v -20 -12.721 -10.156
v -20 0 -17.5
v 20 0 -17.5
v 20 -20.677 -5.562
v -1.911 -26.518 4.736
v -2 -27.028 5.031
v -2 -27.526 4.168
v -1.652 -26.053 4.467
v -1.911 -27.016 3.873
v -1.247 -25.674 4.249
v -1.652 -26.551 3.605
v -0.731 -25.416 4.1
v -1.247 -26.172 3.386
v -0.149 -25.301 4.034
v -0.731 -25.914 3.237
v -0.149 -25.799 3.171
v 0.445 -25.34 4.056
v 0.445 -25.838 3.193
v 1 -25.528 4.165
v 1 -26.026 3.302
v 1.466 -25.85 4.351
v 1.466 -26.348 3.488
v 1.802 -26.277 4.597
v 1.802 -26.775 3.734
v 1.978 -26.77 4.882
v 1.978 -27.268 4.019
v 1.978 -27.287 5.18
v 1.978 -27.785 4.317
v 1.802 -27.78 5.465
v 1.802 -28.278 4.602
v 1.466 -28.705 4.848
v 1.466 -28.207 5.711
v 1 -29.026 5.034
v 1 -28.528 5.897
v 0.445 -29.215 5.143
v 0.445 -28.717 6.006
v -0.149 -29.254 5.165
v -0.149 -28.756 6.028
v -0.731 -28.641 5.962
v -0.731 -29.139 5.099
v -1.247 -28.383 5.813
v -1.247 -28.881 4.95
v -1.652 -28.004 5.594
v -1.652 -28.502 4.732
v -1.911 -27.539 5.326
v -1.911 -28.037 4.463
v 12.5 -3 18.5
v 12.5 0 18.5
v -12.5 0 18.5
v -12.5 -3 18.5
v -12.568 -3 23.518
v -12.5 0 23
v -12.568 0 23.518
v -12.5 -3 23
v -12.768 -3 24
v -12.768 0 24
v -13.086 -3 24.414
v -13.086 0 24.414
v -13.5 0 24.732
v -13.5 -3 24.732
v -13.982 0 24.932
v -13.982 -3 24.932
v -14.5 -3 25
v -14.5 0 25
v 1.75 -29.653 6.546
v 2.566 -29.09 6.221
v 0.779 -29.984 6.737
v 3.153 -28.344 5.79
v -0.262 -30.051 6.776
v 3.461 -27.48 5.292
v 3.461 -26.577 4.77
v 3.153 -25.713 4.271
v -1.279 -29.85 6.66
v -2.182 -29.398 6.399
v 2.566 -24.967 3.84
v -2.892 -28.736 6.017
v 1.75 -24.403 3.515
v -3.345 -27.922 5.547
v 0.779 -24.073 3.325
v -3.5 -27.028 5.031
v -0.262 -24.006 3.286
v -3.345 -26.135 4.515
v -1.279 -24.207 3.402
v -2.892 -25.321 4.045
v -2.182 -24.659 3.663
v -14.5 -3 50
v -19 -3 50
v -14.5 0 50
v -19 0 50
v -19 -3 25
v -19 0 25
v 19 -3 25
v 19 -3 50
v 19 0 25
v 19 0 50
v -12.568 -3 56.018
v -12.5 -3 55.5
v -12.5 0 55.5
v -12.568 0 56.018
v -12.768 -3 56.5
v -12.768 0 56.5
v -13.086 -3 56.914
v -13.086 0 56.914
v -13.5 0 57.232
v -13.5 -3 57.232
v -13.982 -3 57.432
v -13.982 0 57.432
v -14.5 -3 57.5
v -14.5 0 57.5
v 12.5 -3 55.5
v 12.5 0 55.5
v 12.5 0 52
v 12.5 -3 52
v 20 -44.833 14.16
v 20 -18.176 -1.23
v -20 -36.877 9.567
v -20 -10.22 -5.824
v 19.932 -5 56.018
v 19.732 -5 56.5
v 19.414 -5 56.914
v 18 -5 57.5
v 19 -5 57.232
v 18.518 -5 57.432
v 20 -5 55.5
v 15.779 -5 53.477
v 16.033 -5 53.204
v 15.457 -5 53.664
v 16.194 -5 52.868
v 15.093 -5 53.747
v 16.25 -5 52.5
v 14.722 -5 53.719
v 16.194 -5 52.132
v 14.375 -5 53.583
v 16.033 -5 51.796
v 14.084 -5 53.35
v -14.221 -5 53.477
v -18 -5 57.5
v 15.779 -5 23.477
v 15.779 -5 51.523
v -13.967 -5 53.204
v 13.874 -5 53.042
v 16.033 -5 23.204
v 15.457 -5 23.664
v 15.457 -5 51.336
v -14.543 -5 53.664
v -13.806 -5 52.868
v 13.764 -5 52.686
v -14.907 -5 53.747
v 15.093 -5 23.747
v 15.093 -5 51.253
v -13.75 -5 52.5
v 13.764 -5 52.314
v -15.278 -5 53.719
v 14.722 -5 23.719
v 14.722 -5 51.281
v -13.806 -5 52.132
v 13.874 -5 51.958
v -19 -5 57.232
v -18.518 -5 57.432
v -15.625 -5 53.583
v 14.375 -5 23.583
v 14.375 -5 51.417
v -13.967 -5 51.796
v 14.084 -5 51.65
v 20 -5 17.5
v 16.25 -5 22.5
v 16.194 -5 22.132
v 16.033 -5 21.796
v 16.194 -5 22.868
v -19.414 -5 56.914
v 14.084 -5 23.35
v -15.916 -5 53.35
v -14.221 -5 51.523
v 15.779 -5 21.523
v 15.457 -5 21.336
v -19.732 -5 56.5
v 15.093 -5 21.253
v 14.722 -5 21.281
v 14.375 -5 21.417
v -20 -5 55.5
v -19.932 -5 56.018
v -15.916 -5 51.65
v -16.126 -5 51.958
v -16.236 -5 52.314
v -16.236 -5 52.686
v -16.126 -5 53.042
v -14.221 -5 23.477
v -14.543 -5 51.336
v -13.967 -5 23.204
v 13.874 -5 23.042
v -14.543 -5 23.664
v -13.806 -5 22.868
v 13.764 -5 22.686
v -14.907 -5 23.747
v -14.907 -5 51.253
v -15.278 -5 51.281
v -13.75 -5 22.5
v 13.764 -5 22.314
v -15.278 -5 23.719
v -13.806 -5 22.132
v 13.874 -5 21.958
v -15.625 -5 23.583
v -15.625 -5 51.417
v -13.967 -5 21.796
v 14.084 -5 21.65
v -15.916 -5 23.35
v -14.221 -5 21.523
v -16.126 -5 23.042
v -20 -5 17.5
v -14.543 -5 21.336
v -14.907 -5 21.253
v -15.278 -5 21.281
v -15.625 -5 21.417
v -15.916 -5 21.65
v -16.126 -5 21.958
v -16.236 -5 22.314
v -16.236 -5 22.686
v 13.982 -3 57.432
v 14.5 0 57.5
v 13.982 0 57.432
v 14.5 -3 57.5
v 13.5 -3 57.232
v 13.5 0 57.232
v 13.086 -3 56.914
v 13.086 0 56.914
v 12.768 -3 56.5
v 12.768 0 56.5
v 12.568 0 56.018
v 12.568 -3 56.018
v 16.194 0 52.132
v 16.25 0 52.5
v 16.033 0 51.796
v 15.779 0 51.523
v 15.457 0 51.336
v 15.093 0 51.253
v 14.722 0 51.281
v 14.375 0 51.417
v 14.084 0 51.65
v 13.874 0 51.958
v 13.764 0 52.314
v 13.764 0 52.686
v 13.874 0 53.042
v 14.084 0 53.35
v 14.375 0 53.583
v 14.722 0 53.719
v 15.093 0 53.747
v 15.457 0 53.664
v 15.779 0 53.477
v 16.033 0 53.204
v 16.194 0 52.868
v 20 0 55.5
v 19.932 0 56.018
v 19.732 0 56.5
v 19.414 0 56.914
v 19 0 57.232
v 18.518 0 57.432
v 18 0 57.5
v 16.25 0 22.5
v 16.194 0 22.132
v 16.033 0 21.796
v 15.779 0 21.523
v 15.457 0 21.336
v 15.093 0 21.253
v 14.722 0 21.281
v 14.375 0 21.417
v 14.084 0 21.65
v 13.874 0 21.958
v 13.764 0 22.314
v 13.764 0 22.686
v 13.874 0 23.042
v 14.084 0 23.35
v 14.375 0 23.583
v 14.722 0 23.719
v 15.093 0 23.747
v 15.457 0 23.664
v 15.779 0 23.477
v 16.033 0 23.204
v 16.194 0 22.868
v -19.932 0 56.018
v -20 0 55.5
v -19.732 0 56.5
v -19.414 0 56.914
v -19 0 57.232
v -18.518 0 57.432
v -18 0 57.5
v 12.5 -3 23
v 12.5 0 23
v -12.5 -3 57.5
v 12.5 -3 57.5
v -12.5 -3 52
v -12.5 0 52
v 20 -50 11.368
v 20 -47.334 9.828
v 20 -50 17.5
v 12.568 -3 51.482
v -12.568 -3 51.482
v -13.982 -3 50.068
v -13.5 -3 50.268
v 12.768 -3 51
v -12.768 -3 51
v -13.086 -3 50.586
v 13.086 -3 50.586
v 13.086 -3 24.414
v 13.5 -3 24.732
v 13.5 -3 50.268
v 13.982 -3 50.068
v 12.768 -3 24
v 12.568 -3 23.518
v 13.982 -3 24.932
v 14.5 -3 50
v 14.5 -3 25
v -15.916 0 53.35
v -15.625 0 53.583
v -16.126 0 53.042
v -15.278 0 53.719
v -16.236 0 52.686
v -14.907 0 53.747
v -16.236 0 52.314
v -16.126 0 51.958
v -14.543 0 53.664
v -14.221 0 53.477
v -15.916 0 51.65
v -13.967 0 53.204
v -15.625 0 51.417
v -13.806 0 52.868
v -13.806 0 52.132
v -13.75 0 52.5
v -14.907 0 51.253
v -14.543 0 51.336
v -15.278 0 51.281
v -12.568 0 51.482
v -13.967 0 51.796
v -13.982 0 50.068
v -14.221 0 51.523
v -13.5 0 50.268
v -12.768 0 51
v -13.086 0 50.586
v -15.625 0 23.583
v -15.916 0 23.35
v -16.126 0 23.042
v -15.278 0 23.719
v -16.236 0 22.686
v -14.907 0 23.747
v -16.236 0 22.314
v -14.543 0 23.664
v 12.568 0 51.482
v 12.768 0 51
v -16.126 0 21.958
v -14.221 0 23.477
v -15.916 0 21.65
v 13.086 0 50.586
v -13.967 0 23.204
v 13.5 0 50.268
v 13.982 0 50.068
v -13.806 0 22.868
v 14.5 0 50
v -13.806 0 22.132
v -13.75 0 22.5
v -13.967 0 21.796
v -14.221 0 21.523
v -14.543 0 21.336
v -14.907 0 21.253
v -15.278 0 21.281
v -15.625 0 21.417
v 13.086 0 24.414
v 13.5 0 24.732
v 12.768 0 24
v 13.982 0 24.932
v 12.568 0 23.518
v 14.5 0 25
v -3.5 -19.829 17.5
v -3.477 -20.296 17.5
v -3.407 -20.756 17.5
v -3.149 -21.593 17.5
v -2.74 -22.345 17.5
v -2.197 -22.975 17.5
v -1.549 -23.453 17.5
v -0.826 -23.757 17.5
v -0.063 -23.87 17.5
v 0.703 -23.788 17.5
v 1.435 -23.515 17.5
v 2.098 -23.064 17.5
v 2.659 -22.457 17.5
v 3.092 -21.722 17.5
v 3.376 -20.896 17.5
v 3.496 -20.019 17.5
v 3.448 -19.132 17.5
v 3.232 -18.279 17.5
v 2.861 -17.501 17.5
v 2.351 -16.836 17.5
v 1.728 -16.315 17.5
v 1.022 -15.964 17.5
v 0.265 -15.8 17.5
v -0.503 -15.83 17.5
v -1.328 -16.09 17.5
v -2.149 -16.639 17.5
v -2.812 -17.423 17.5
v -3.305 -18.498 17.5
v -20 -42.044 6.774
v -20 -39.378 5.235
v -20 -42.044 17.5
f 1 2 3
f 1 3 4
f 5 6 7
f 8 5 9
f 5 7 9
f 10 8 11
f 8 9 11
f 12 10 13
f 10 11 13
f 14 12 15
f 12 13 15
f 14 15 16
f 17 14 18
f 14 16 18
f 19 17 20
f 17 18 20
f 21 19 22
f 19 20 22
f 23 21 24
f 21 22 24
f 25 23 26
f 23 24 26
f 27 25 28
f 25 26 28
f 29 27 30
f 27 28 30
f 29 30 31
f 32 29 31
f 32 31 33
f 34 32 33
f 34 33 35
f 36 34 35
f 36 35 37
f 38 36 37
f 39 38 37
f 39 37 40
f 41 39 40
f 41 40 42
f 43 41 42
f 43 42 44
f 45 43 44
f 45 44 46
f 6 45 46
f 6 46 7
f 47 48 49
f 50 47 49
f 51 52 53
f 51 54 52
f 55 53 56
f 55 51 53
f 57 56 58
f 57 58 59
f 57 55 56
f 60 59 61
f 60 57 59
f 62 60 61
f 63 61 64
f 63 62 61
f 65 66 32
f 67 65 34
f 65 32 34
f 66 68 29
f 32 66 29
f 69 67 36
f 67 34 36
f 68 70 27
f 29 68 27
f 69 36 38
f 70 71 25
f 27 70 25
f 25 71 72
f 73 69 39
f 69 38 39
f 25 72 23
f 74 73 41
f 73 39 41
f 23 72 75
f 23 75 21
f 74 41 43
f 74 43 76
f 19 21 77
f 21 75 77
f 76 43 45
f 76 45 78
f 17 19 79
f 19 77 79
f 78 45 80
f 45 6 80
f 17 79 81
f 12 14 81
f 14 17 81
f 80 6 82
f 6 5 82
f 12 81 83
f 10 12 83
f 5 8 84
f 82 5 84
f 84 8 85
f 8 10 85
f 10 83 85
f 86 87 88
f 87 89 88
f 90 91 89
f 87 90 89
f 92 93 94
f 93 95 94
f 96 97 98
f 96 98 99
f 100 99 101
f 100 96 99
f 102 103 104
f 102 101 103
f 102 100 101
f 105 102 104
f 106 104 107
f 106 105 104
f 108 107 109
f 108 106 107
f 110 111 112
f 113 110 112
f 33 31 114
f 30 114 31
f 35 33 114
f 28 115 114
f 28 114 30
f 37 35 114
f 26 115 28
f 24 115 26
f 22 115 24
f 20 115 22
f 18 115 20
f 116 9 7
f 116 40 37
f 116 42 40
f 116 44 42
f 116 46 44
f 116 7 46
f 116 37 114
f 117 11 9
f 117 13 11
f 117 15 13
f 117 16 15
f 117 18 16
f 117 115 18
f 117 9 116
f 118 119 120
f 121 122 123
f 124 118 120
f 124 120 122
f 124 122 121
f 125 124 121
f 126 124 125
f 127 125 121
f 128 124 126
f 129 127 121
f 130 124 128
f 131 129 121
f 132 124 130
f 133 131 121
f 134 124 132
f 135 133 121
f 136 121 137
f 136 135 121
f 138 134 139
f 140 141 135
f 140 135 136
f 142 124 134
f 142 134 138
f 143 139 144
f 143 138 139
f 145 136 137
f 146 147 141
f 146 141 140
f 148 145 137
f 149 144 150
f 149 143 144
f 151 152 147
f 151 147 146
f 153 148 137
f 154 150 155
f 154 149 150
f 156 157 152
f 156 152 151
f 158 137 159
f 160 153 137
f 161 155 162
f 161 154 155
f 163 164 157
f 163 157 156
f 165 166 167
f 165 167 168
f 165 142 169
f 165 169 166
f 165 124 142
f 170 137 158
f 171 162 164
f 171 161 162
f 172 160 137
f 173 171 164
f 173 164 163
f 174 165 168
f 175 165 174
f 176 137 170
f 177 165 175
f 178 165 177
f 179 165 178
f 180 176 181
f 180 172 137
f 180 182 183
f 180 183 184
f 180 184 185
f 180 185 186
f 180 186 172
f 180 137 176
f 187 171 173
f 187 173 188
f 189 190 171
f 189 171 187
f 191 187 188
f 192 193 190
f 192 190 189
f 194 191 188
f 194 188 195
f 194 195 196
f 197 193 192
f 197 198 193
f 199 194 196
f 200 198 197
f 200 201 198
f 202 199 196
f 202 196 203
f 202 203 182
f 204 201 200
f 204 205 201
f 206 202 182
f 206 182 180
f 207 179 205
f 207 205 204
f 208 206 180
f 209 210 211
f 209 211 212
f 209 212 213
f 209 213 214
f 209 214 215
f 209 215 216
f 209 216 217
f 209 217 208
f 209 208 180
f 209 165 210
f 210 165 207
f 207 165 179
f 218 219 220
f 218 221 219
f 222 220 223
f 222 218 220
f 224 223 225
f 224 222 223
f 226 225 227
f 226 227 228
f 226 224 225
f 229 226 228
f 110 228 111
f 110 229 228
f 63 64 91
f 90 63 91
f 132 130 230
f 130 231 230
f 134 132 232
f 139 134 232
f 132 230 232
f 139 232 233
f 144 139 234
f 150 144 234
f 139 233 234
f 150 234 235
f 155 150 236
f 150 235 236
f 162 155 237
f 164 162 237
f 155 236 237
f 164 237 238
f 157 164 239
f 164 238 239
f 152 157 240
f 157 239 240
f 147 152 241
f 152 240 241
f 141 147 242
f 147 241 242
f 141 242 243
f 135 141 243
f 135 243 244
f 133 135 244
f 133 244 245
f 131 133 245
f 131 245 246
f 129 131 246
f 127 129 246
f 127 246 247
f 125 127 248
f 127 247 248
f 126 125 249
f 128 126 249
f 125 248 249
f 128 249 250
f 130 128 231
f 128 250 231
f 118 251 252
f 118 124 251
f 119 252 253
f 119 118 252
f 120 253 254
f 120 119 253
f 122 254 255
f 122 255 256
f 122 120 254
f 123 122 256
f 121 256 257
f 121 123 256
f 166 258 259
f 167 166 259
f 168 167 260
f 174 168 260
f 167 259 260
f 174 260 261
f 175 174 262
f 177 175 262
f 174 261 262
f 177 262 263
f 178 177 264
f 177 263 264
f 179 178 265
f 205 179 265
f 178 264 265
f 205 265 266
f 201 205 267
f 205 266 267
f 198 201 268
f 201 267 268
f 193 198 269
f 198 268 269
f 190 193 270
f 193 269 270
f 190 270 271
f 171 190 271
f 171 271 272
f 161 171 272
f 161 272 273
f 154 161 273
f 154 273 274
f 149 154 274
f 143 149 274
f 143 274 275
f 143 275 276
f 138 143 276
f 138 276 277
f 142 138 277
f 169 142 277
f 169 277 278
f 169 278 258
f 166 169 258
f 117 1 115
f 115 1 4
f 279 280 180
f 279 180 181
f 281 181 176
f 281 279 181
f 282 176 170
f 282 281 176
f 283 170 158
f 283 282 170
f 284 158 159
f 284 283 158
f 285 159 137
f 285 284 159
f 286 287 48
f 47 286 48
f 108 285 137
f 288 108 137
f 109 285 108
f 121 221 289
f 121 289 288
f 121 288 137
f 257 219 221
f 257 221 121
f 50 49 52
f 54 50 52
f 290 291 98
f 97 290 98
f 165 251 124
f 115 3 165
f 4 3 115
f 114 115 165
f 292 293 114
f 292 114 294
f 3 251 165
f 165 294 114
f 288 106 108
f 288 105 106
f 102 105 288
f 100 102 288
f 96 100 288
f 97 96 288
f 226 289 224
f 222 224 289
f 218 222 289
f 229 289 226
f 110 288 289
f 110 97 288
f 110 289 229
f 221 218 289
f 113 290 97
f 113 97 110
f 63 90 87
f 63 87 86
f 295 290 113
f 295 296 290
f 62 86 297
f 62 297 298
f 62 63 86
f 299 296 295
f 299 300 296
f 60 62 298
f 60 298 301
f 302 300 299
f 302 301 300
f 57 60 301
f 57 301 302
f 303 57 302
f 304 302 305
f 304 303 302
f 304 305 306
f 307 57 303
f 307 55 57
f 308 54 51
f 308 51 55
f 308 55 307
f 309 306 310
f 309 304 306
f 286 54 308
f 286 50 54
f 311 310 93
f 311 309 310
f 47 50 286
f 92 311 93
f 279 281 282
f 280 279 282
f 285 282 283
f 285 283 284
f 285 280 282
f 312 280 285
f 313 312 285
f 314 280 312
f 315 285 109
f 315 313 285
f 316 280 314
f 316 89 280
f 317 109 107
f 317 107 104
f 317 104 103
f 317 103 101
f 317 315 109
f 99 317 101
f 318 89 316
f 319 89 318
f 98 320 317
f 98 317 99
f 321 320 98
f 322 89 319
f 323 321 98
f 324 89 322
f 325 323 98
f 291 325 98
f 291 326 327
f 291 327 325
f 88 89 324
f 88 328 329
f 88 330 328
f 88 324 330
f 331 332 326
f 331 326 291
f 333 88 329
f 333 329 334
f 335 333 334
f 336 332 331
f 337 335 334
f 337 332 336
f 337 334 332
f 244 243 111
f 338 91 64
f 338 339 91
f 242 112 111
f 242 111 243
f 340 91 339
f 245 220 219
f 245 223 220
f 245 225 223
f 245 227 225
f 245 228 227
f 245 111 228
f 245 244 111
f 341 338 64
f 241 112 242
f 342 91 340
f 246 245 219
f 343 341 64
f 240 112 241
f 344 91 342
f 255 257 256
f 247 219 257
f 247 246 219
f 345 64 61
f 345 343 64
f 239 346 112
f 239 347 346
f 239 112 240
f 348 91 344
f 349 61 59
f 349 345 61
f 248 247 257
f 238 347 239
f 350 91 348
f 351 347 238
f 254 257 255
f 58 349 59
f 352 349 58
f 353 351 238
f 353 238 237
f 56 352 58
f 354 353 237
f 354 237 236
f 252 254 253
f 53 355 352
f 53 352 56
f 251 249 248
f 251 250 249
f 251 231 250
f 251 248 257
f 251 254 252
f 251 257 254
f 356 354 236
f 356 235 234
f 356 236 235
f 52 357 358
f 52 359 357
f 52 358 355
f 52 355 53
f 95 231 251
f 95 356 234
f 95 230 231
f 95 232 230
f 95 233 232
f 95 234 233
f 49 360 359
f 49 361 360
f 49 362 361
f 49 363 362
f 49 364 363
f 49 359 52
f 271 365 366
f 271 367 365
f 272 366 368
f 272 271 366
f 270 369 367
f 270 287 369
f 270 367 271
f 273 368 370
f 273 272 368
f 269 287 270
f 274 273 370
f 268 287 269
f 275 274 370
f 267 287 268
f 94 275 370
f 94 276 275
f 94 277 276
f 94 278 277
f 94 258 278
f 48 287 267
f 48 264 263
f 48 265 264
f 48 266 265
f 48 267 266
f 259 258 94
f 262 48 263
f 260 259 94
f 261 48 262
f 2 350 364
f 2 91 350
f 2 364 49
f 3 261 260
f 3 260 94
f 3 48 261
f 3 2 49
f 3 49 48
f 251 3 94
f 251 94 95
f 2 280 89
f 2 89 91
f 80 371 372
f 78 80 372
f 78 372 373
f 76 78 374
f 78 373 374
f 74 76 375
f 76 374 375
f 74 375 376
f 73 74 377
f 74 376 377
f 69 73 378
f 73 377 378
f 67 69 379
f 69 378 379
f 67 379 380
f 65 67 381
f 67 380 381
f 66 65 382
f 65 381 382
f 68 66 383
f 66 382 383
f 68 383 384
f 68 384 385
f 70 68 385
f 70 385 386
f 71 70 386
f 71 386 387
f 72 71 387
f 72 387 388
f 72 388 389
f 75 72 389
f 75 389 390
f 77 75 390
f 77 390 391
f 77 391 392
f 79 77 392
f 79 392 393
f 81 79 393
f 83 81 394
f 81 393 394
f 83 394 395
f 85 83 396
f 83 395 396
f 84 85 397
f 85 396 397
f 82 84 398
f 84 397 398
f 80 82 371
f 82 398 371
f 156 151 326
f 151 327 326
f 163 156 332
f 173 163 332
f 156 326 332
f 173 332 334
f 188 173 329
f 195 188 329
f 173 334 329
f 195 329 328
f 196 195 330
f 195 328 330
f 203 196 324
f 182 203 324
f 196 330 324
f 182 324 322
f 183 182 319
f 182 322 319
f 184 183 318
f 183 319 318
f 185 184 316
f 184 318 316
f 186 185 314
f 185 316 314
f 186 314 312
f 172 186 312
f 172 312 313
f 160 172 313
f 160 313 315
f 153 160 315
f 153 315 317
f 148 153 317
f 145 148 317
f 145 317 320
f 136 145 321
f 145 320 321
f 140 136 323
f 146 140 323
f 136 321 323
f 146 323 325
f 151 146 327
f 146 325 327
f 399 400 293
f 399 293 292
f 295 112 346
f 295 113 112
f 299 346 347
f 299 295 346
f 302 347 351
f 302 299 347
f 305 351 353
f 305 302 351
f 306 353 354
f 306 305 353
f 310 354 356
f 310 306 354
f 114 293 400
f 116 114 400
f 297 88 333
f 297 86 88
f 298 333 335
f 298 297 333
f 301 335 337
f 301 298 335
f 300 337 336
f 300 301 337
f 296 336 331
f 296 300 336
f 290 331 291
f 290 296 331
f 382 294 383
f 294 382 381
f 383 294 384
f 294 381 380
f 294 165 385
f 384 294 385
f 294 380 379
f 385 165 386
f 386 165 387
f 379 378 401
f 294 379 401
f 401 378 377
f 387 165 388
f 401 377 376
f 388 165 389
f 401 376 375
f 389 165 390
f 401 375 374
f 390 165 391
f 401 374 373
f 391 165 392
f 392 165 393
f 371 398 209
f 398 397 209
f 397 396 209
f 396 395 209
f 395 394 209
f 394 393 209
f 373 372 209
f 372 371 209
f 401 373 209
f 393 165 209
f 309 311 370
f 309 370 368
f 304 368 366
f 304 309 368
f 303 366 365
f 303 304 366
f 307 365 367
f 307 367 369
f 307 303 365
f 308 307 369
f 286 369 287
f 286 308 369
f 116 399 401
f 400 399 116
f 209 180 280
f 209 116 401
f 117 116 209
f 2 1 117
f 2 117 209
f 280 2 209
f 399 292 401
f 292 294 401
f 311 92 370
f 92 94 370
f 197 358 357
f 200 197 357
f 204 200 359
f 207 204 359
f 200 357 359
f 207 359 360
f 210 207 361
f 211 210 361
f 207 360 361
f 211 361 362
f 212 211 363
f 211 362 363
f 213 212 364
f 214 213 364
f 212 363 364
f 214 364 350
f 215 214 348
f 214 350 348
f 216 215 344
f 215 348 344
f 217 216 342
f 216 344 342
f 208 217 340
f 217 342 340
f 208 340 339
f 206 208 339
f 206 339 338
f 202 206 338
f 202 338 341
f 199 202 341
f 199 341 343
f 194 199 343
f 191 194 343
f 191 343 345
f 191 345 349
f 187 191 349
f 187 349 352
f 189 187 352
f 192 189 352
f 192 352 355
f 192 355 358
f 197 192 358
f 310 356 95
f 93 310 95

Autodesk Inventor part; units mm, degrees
ref_plane "YZ Plane" through (0, 0, 0) normal (1, 0, 0) x (0, 1, 0)
ref_plane "XZ Plane" through (0, 0, 0) normal (0, 1, 0) x (-1, 0, 0)
sketch "Sketch1" plane through (0, 0, 0) normal (0, 1, 0) x (-1, 0, 0)
  line L0 (19, 19) -> (-19, 19) construction
  line L1 (-19, 19) -> (-19, -19) construction
  line L2 (-19, -19) -> (19, -19) construction
  line L3 (19, -19) -> (19, 19) construction
  line L4 (19, 19) -> (-19, -19) construction
  line L5 (-19, 19) -> (19, -19) construction
  circle A0 centre (15, -15) radius 1.25
  circle A1 centre (-15, -15) radius 1.25
  circle A2 centre (15, 15) radius 1.25
  circle A3 centre (-15, 15) radius 1.25
  line L6 (20, 20) -> (-20, 20)
  line L7 (-20, 20) -> (-20, -20)
  line L8 (-20, -20) -> (20, -20)
  line L9 (20, -20) -> (20, 20)
  line L10 (20, 20) -> (-20, -20) construction
  line L11 (-20, 20) -> (20, -20) construction
  point P0 (0, 0)
  dimension "d0" = 38
  dimension "d1" = 38
  dimension "d2" = 2.5
  dimension "d3" = 2.5
  dimension "d4" = 2.5
  dimension "d5" = 2.5
  dimension "d6" = 4
  dimension "d7" = 4
  dimension "d8" = 4
  dimension "d9" = 4
  dimension "d10" = 40
  dimension "d11" = 40
extrude "Extrusion1" add sketch "Sketch1" along normal blind 5
sketch "Sketch2" plane through (0, 5, 0) normal (0, 1, 0) x (1, 0, 0)
  line L0 (-12.5, 19) -> (-12.5, 12.5)
  line L1 (-12.5, 12.5) -> (-19, 12.5)
  line L2 (-19, 12.5) -> (-19, -12.5)
  line L3 (-20, 20) -> (-20, -20) projected
  line L4 (-19, -12.5) -> (-12.5, -12.5)
  line L5 (-12.5, -12.5) -> (-12.5, -20)
  line L6 (-12.5, -20) -> (12.5, -20)
  line L7 (12.5, -20) -> (12.5, -12.5)
  line L8 (12.5, -12.5) -> (19, -12.5)
  line L9 (19, -12.5) -> (19, 12.5)
  line L10 (19, 12.5) -> (12.5, 12.5)
  line L11 (12.5, 12.5) -> (12.5, 19)
  line L12 (12.5, 19) -> (-12.5, 19)
  point P0 (0, 0)
  dimension "d14" = 25
  dimension "d15" = 6.5
  dimension "d16" = 25
  dimension "d17" = 7.5
  dimension "d18" = 6.5
  dimension "d19" = 6.5
  dimension "d20" = 25
  dimension "d21" = 6.5
  dimension "d22" = 12.5
  dimension "d24" = 12.5
extrude "Extrusion2" cut sketch "Sketch2" against normal blind 3
sketch "Sketch3" plane through (0, 2, 0) normal (0, 1, 0) x (1, 0, 0)
  line L0 (12.5, -12.5) -> (12.5, -20) projected
  line L1 (-12.5, -20) -> (12.5, -20)
  line L2 (12.5, -20) -> (12.5, -16)
  line L3 (12.5, -16) -> (-12.5, -16)
  line L4 (-12.5, -16) -> (-12.5, -20)
  point P0 (0, 0)
  dimension "d27" = 4
extrude "Extrusion3" cut sketch "Sketch3" against normal through all
fillet "Fillet1" radius 2 10 edges at (-20, 2.5, -20) (20, 2.5, -20) (-20, 2.5, 20) (20, 2.5, 20) (-12.5, 3.5, -12.5) (12.5, 3.5, -12.5) (12.5, 3.5, 12.5) (-12.5, 3.5, 12.5) (-12.5, 2.5, 20) (12.5, 2.5, 20)
sketch "Sketch4" plane through (0, 0, 0) normal (0, -1, 0) x (1, 0, 0)
  line L0 (-20, -17.5) -> (20, -17.5)
  line L1 (20, -17.5) -> (20, 17.5)
  line L2 (20, 17.5) -> (-20, 17.5)
  line L3 (-20, 17.5) -> (-20, -17.5)
  line L4 (-20, -17.5) -> (20, 17.5) construction
  line L5 (20, -17.5) -> (-20, 17.5) construction
  point P0 (0, 0)
  dimension "d31" = 40
  dimension "d32" = 35
extrude "Extrusion4" add sketch "Sketch4" along normal blind 50
sketch "Sketch6" plane through (-20, 0, 17.5) normal (0, 0, 1) x (1, 0, 0)
  line L0 (40, 0) -> (40, -50) projected
  line L1 (40, -50) -> (0, -42.0435)
  line L2 (0, 0) -> (0, -50) projected
  line L3 (40, -50) -> (80.7836, -50) construction
  line L4 (0, -42.0435) -> (0, -50)
  line L5 (0, -50) -> (40, -50)
  point P0 (20, 0)
  dimension "d35" = 168.75
extrude "Extrusion5" cut sketch "Sketch6" against normal through all
sketch "Sketch7" plane through (20, 0, 17.5) normal (1, 0, 0) x (0, 0, 1)
  line L0 (-35, 0) -> (-35, 50) projected
  line L1 (-35, 0) -> (-6.1325, 50)
  line L2 (-35, 50) -> (0, 50) projected
  line L3 (-35, 0) -> (22.735, 0) construction
  line L4 (-6.1325, 50) -> (-35, 50)
  line L5 (-35, 50) -> (-35, 0)
  point P0 (-17.5, 0)
  dimension "d38" = 120
extrude "Extrusion6" cut sketch "Sketch7" against normal through all
sketch "Sketch17" plane through (20, 0, -17.5) normal (0, -0.5, -0.8660254) x (-1, 0, 0)
  line L0 (40, -48.5477) -> (0, -57.735) construction
  line L1 (40, 0) -> (40, -48.5477) construction
  line L2 (0, 0) -> (40, 0) construction
  line L3 (0, -57.735) -> (0, 0) construction
  line L4 (0, -54.6569) -> (40, -45.4695) construction
  line L5 (0, -23.8758) -> (40, -14.6884) construction
  line L6 (0, -54.6569) -> (40, -45.4695)
  line L7 (40, -14.6884) -> (0, -23.8758)
  line L8 (0, -23.8758) -> (0, -54.6569)
  line L9 (40, -45.4695) -> (40, -14.6884)
  point P0 (20, -8.75)
  dimension "d60" = 30
  dimension "d61" = 3
extrude "Extrusion9" cut sketch "Sketch17" against normal blind 5
sketch "Sketch18" plane through (20, 2.5, -13.1699) normal (0, -0.5, -0.8660254) x (-1, 0, 0)
  line L0 (40, -14.6884) -> (40, -45.4695) construction
  line L1 (0, -23.8758) -> (40, -14.6884) construction
  line L2 (0, -54.6569) -> (0, -23.8758) construction
  line L3 (40, -45.4695) -> (0, -54.6569) construction
  line L4 (0, -54.6569) -> (40, -14.6884) construction
  line L5 (0, -23.8758) -> (40, -45.4695) construction
  circle A0 centre (20, -34.6727) radius 2
  circle A1 centre (20, -34.6727) radius 4.6064
  point P0 (20, -8.75)
  dimension "d64" = 4
extrude "Extrusion11" cut sketch "Sketch18" against normal through all contours A0
ref_plane "Work Plane3" through (20, 15.5, 9.3468) normal (0, -0.5, -0.8660254) x (-1, 0, 0)
sketch "Sketch20" plane through (20, 15.5, 9.3468) normal (0, -0.5, -0.8660254) x (-1, 0, 0)
  circle A0 centre (20, -34.6727) radius 2 projected
  circle A1 centre (20, -34.6727) radius 3.5
  point P0 (20, -8.75)
  dimension "d70" = 7
extrude "Extrusion12" cut sketch "Sketch20" along normal blind 25
sketch "Sketch21" plane through (-20, 0, 17.5) normal (0, 0, 1) x (1, 0, 0)
  line L0 (0, 0) -> (40, 0)
  line L1 (40, 0) -> (40, -5)
  line L2 (40, -5) -> (0, -5)
  line L3 (0, -5) -> (0, 0)
  point P0 (20, 0)
  dimension "d73" = 5
extrude "Extrusion13" add sketch "Sketch21" along normal blind 40
sketch "Sketch22" plane through (20, 0, -18) normal (1, 0, 0) x (0, 0, -1)
  line L0 (2, 0) -> (0, 0) projected
  line L1 (-38, 5) -> (-36, 5) projected
  line L2 (2, 0) -> (-38, 0)
  line L3 (-38, 0) -> (-38, 5)
  line L4 (-38, 5) -> (2, 5)
  line L5 (2, 5) -> (2, 0)
  point P0 (-18, 0)
extrude "Extrusion14" cut sketch "Sketch22" against normal through all
sketch "Sketch23" plane through (-20, 0, 57.5) normal (0, 1, 0) x (1, 0, 0)
  line L0 (40, 0) -> (0, 0) construction
  line L1 (20, 0) -> (20, 20) construction
  line L2 (39, 39) -> (1, 39) construction
  line L3 (1, 39) -> (1, 1) construction
  line L4 (1, 1) -> (39, 1) construction
  line L5 (39, 1) -> (39, 39) construction
  line L6 (39, 39) -> (1, 1) construction
  line L7 (1, 39) -> (39, 1) construction
  circle A0 centre (35, 5) radius 1.25
  line L8 (20, 20) -> (1, 20) construction
  circle A1 centre (5, 5) radius 1.25
  circle A2 centre (35, 35) radius 1.25
  circle A3 centre (5, 35) radius 1.25
  point P0 (20, 57.5)
  dimension "d78" = 20
  dimension "d79" = 38
  dimension "d80" = 38
  dimension "d81" = 4
  dimension "d82" = 2.5
extrude "Extrusion15" cut sketch "Sketch23" against normal through all
sketch "Sketch24" plane through (-20, 0, 57.5) normal (0, 1, 0) x (1, 0, 0)
  line L0 (1, 7.5) -> (7.5, 7.5)
  line L1 (7.5, 7.5) -> (7.5, 0)
  line L2 (7.5, 0) -> (32.5, 0)
  line L3 (32.5, 0) -> (32.5, 7.5)
  line L4 (32.5, 7.5) -> (39, 7.5)
  line L5 (39, 7.5) -> (39, 32.5)
  line L6 (39, 32.5) -> (32.5, 32.5)
  line L7 (32.5, 32.5) -> (32.5, 39)
  line L8 (32.5, 39) -> (7.5, 39)
  line L9 (7.5, 39) -> (7.5, 32.5)
  line L10 (7.5, 32.5) -> (1, 32.5)
  line L11 (1, 32.5) -> (1, 7.5)
  line L12 (0, 0) -> (40, 0) construction
  line L13 (0, 75) -> (0, 0) projected
  point P0 (20, 57.5)
  point P1 (39, 20)
  point P2 (20, 39)
  dimension "d85" = 6.5
  dimension "d86" = 25
  dimension "d87" = 6.5
  dimension "d88" = 25
  dimension "d90" = 7.5
  dimension "d91" = 25
  dimension "d92" = 6.5
  dimension "d93" = 20
  dimension "d94" = 7.5
  dimension "d95" = 6.5
  dimension "d96" = 20
extrude "Extrusion16" cut sketch "Sketch24" against normal blind 3
fillet "Fillet2" radius 2 8 edges at (-12.5, -1.5, 50) (-12.5, -1.5, 25) (12.5, -1.5, 25) (12.5, -1.5, 50) (12.5, -1.5, 57.5) (-12.5, -1.5, 57.5) (20, -2.5, 57.5) (-20, -2.5, 57.5)
properties part number "CameraMountM12v2"
